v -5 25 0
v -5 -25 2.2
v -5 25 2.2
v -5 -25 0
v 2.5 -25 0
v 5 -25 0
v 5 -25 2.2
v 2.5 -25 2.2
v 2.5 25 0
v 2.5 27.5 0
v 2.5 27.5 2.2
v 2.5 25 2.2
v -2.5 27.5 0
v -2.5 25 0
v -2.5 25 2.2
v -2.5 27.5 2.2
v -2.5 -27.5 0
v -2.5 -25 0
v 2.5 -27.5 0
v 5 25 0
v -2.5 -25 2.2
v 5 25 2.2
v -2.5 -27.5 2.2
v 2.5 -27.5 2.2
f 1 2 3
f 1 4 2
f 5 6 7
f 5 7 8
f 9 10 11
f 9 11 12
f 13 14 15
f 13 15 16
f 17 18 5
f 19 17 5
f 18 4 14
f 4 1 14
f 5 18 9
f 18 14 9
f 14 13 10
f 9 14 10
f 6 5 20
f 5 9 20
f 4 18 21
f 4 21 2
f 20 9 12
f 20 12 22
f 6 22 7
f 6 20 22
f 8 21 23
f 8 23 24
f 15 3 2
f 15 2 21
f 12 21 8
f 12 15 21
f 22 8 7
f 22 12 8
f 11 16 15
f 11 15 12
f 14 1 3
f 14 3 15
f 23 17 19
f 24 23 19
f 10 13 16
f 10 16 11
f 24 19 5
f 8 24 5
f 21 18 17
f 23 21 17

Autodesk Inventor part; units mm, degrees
ref_plane "YZ Plane" through (0, 0, 0) normal (1, 0, 0) x (0, 1, 0)
ref_plane "XZ Plane" through (0, 0, 0) normal (0, 1, 0) x (-1, 0, 0)
ref_plane "XY Plane" through (0, 0, 0) normal (0, 0, 1) x (1, 0, 0)
sketch "Sketch1" plane through (0, 0, 0) normal (0, 0, 1) x (1, 0, 0)
  line L0 (-7, 0) -> (7, 0) projected
  line L1 (0, -38.5) -> (0, 38.5) projected
  line L2 (5, 25) -> (5, -25)
  line L3 (-5, -25) -> (-5, 25)
  line L4 (-2.5, -25) -> (-2.5, -27.5)
  line L5 (-2.5, -27.5) -> (2.5, -27.5)
  line L6 (2.5, -27.5) -> (2.5, -25)
  line L7 (5, -25) -> (2.5, -25)
  line L8 (-2.5, -25) -> (-5, -25)
  line L9 (-2.5, 25) -> (-2.5, 27.5)
  line L10 (-2.5, 27.5) -> (2.5, 27.5)
  line L11 (2.5, 27.5) -> (2.5, 25)
  line L12 (-5, 25) -> (-2.5, 25)
  line L13 (2.5, 25) -> (5, 25)
  point P0 (0, 0)
  dimension "d0" = 10
  dimension "d1" = 50
  dimension "d3" = 5
  dimension "d7" = 2.5
  dimension "d8" = 2.5
  dimension "d10" = 2.5
  dimension "d11" = 2.5
  dimension "d12" = 2.5
extrude "Extrusion1" add sketch "Sketch1" along normal blind 2.2
equation "\"d3\" = 0.5 * d0"
equation "\"d2\" = 0.5 * d1"
properties part number "Acrylic_2.2_Lower"
